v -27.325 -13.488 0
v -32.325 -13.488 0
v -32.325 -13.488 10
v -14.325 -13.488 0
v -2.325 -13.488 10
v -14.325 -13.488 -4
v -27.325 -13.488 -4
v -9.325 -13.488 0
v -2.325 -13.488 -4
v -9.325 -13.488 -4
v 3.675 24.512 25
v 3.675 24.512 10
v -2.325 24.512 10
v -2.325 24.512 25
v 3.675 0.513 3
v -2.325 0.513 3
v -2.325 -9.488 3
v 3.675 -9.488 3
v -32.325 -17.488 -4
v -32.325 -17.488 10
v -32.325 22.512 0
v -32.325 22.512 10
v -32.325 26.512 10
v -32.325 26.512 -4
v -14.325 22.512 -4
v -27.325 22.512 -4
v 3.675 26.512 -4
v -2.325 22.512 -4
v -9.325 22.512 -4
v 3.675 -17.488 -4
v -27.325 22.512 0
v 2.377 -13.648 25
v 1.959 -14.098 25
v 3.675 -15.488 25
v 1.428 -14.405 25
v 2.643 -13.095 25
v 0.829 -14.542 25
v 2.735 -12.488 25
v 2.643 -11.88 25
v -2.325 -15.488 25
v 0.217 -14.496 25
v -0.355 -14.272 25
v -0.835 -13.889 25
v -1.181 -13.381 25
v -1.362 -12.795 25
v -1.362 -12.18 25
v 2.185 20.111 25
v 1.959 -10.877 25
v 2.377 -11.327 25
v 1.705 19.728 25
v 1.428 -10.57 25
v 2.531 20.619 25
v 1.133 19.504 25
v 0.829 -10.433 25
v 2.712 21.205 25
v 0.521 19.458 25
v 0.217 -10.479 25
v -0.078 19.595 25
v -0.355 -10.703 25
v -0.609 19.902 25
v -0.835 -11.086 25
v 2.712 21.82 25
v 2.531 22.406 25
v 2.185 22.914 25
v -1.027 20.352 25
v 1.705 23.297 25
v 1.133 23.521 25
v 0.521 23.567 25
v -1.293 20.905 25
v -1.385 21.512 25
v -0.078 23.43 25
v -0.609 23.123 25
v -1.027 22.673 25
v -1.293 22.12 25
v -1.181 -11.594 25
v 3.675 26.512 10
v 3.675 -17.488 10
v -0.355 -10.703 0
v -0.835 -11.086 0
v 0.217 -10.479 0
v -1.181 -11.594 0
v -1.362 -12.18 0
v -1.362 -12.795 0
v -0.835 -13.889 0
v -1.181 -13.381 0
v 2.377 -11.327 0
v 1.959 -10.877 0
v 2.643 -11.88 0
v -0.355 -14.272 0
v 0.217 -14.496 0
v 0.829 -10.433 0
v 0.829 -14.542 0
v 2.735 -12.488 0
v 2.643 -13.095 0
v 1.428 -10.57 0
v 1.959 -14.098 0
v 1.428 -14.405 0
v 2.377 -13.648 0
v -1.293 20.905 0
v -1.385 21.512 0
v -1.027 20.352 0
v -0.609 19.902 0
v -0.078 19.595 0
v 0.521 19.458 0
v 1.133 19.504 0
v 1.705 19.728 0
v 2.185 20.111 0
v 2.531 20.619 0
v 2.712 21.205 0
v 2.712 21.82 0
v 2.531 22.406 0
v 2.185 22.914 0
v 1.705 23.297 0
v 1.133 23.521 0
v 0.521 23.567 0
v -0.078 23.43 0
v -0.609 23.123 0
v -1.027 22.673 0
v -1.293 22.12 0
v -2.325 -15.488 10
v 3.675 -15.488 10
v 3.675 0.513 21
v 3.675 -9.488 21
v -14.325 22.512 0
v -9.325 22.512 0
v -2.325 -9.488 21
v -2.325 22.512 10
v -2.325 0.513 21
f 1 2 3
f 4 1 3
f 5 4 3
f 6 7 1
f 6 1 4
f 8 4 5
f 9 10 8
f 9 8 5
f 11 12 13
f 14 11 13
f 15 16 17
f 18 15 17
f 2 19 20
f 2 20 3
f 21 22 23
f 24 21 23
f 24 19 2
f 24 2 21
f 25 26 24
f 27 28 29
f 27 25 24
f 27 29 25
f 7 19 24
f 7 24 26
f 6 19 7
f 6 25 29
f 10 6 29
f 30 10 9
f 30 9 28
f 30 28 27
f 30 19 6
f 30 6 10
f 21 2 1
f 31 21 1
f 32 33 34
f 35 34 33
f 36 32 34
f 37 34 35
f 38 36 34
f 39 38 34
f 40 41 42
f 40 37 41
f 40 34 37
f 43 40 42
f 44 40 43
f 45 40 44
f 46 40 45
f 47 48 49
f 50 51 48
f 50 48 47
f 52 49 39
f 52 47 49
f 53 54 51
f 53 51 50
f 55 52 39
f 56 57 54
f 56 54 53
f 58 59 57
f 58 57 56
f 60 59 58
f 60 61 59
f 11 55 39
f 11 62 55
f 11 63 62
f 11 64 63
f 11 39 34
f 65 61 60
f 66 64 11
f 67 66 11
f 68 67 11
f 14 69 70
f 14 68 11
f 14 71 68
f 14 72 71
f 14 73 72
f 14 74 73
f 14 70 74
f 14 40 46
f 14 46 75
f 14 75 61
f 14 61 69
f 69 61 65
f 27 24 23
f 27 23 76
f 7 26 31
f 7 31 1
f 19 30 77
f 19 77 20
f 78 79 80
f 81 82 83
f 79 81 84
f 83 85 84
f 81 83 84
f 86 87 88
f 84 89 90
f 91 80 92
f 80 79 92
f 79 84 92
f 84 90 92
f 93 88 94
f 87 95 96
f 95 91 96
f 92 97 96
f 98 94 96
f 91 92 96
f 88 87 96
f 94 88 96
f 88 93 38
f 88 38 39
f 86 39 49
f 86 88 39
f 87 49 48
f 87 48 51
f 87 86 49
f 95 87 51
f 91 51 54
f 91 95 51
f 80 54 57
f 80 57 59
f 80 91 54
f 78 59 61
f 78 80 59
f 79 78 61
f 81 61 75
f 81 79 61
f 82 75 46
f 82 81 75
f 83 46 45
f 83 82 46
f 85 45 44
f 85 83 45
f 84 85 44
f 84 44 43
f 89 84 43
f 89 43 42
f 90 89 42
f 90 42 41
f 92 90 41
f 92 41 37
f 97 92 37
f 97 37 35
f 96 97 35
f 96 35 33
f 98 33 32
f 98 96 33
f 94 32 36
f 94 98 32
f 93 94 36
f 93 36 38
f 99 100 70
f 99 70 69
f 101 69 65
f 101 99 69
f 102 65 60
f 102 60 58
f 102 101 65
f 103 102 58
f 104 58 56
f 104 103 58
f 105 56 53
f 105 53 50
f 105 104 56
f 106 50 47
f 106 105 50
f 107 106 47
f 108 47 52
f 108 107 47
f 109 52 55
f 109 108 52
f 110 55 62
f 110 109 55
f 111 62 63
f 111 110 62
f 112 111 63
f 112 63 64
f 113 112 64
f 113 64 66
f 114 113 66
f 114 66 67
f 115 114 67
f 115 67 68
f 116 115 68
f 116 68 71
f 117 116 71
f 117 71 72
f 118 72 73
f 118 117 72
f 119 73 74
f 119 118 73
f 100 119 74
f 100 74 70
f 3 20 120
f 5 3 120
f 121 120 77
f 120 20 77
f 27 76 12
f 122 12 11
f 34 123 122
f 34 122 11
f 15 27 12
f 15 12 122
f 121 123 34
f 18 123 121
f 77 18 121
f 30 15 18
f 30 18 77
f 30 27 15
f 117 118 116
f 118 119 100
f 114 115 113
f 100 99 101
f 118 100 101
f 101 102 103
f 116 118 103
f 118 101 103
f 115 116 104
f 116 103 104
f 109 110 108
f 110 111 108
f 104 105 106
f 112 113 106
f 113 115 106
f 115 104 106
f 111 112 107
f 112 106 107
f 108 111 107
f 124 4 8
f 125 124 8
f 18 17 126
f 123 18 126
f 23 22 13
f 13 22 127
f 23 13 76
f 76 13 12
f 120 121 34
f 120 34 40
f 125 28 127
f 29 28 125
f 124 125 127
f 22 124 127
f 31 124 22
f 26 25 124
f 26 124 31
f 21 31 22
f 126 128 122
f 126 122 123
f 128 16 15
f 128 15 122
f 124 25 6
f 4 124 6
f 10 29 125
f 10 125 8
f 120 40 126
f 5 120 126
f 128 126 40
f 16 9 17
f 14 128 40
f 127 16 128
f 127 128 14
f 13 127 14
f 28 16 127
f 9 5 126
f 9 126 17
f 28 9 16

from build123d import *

# Parameters (mm, degrees)
SKETCH1_W           = 40
SKETCH1_H           = 6
SKETCH1_R           = 2.06
BOSS_EXTRUDE1_DEPTH = 25
BOSS_EXTRUDE2_DEPTH = 10
BOSS_EXTRUDE4_START = 4
SKETCH4_W           = 5
SKETCH4_H           = 36
BOSS_EXTRUDE4_DEPTH = 4
SKETCH5_W           = 10
SKETCH5_H           = 18
CUT_EXTRUDE1_DEPTH  = 8


with BuildPart() as part:
    # Sketch1 → Boss-Extrude1 (new body)
    with BuildSketch(Plane(origin=(0, 0, 0), x_dir=(0, 1, 0), z_dir=(0, 0, 1))):
        with Locations((4.5125, -0.675)):
            Rectangle(SKETCH1_W, SKETCH1_H)
        with Locations(Location((-12.4875, -0.675, 0), (0, 0, 270))):
            Circle(SKETCH1_R, mode=Mode.SUBTRACT)
        with Locations(Location((21.5125, -0.675, 0), (0, 0, 90))):
            Circle(SKETCH1_R, mode=Mode.SUBTRACT)
    extrude(amount=BOSS_EXTRUDE1_DEPTH)

    # Sketch2 → Boss-Extrude2 (add)
    with BuildSketch(Plane(origin=(0, 0, 0), x_dir=(1, 0, 0), z_dir=(0, 0, -1))):
        Polygon((-2.325, 15.4875), (3.675, 15.4875), (3.675, 17.4875), (-32.325, 17.4875), (-32.325, 13.4875), (-2.325, 13.4875), align=None)
        Polygon((3.675, -26.5125), (3.675, -24.5125), (-2.325, -24.5125), (-2.325, -22.5125), (-32.325, -22.5125), (-32.325, -26.5125), align=None)
    extrude(amount=-BOSS_EXTRUDE2_DEPTH)

    # Sketch4 → Boss-Extrude4 (add)
    with BuildSketch(Plane(origin=(0, 0, 0), x_dir=(1, 0, 0), z_dir=(0, 0, -1)).offset(BOSS_EXTRUDE4_START)):
        with BuildLine():
            Line((3.675, 17.4875), (-32.325, 17.4875))
            Line((-32.325, 17.4875), (-32.325, 13.4875))
            Line((-32.325, 13.4875), (-27.325, 13.4875))
            Line((-27.325, 13.4875), (-14.325, 13.4875))
            Line((-14.325, 13.4875), (-9.325, 13.4875))
            Line((-9.325, 13.4875), (-2.325, 13.4875))
            Line((-2.325, 13.4875), (-1.125999722, 13.4875))
            ThreePointArc((-1.125999722, 13.4875), (0.675, 14.5475), (2.475999722, 13.4875))
            Line((2.475999722, 13.4875), (3.675, 13.4875))
            Line((3.675, 13.4875), (3.675, 17.4875))
        make_face()
        with BuildLine():
            ThreePointArc((2.735, 12.4875), (2.669199016, 13.003998099), (2.475999722, 13.4875))
            Line((2.475999722, 13.4875), (-1.125999722, 13.4875))
            ThreePointArc((-1.125999722, 13.4875), (0.158501901, 10.493300984), (2.735, 12.4875))
        make_face()
        with BuildLine():
            Line((-1.125999722, 13.4875), (2.475999722, 13.4875))
            ThreePointArc((2.475999722, 13.4875), (0.675, 14.5475), (-1.125999722, 13.4875))
        make_face()
        with BuildLine():
            Line((3.675, -22.5125), (3.675, 13.4875))
            Line((3.675, 13.4875), (2.475999722, 13.4875))
            ThreePointArc((2.475999722, 13.4875), (2.669199016, 13.003998099), (2.735, 12.4875))
            ThreePointArc((2.735, 12.4875), (0.158501901, 10.493300984), (-1.125999722, 13.4875))
            Line((-1.125999722, 13.4875), (-2.325, 13.4875))
            Line((-2.325, 13.4875), (-2.325, -22.5125))
            Line((-2.325, -22.5125), (-1.125999722, -22.5125))
            ThreePointArc((-1.125999722, -22.5125), (0.158501901, -19.518300984), (2.735, -21.5125))
            ThreePointArc((2.735, -21.5125), (2.669199016, -22.028998099), (2.475999722, -22.5125))
            Line((2.475999722, -22.5125), (3.675, -22.5125))
        make_face()
        with BuildLine():
            ThreePointArc((-1.125999722, -22.5125), (0.675, -23.5725), (2.475999722, -22.5125))
            Line((2.475999722, -22.5125), (-1.125999722, -22.5125))
        make_face()
        with BuildLine():
            Line((-1.125999722, -22.5125), (2.475999722, -22.5125))
            ThreePointArc((2.475999722, -22.5125), (2.669199016, -22.028998099), (2.735, -21.5125))
            ThreePointArc((2.735, -21.5125), (0.158501901, -19.518300984), (-1.125999722, -22.5125))
        make_face()
        with BuildLine():
            Line((-27.325, -22.5125), (-32.325, -22.5125))
            Line((-32.325, -22.5125), (-32.325, -26.5125))
            Line((-32.325, -26.5125), (3.675, -26.5125))
            Line((3.675, -26.5125), (3.675, -22.5125))
            Line((3.675, -22.5125), (2.475999722, -22.5125))
            ThreePointArc((2.475999722, -22.5125), (0.675, -23.5725), (-1.125999722, -22.5125))
            Line((-1.125999722, -22.5125), (-2.325, -22.5125))
            Line((-2.325, -22.5125), (-9.325, -22.5125))
            Line((-9.325, -22.5125), (-14.325, -22.5125))
            Line((-14.325, -22.5125), (-27.325, -22.5125))
        make_face()
        with Locations((-29.825, -4.5125)):
            Rectangle(SKETCH4_W, SKETCH4_H)
        with Locations((-11.825, -4.5125)):
            Rectangle(SKETCH4_W, SKETCH4_H)
    extrude(amount=-BOSS_EXTRUDE4_DEPTH)

    # Sketch5 → Cut-Extrude1 (cut)
    with BuildSketch(Plane(origin=(-2.325, 0, 0), x_dir=(0, -1, 0), z_dir=(-1, 0, 0))):
        with Locations((4.4875, 12)):
            Rectangle(SKETCH5_W, SKETCH5_H)
    extrude(amount=-CUT_EXTRUDE1_DEPTH, mode=Mode.SUBTRACT)


solid = part.part
